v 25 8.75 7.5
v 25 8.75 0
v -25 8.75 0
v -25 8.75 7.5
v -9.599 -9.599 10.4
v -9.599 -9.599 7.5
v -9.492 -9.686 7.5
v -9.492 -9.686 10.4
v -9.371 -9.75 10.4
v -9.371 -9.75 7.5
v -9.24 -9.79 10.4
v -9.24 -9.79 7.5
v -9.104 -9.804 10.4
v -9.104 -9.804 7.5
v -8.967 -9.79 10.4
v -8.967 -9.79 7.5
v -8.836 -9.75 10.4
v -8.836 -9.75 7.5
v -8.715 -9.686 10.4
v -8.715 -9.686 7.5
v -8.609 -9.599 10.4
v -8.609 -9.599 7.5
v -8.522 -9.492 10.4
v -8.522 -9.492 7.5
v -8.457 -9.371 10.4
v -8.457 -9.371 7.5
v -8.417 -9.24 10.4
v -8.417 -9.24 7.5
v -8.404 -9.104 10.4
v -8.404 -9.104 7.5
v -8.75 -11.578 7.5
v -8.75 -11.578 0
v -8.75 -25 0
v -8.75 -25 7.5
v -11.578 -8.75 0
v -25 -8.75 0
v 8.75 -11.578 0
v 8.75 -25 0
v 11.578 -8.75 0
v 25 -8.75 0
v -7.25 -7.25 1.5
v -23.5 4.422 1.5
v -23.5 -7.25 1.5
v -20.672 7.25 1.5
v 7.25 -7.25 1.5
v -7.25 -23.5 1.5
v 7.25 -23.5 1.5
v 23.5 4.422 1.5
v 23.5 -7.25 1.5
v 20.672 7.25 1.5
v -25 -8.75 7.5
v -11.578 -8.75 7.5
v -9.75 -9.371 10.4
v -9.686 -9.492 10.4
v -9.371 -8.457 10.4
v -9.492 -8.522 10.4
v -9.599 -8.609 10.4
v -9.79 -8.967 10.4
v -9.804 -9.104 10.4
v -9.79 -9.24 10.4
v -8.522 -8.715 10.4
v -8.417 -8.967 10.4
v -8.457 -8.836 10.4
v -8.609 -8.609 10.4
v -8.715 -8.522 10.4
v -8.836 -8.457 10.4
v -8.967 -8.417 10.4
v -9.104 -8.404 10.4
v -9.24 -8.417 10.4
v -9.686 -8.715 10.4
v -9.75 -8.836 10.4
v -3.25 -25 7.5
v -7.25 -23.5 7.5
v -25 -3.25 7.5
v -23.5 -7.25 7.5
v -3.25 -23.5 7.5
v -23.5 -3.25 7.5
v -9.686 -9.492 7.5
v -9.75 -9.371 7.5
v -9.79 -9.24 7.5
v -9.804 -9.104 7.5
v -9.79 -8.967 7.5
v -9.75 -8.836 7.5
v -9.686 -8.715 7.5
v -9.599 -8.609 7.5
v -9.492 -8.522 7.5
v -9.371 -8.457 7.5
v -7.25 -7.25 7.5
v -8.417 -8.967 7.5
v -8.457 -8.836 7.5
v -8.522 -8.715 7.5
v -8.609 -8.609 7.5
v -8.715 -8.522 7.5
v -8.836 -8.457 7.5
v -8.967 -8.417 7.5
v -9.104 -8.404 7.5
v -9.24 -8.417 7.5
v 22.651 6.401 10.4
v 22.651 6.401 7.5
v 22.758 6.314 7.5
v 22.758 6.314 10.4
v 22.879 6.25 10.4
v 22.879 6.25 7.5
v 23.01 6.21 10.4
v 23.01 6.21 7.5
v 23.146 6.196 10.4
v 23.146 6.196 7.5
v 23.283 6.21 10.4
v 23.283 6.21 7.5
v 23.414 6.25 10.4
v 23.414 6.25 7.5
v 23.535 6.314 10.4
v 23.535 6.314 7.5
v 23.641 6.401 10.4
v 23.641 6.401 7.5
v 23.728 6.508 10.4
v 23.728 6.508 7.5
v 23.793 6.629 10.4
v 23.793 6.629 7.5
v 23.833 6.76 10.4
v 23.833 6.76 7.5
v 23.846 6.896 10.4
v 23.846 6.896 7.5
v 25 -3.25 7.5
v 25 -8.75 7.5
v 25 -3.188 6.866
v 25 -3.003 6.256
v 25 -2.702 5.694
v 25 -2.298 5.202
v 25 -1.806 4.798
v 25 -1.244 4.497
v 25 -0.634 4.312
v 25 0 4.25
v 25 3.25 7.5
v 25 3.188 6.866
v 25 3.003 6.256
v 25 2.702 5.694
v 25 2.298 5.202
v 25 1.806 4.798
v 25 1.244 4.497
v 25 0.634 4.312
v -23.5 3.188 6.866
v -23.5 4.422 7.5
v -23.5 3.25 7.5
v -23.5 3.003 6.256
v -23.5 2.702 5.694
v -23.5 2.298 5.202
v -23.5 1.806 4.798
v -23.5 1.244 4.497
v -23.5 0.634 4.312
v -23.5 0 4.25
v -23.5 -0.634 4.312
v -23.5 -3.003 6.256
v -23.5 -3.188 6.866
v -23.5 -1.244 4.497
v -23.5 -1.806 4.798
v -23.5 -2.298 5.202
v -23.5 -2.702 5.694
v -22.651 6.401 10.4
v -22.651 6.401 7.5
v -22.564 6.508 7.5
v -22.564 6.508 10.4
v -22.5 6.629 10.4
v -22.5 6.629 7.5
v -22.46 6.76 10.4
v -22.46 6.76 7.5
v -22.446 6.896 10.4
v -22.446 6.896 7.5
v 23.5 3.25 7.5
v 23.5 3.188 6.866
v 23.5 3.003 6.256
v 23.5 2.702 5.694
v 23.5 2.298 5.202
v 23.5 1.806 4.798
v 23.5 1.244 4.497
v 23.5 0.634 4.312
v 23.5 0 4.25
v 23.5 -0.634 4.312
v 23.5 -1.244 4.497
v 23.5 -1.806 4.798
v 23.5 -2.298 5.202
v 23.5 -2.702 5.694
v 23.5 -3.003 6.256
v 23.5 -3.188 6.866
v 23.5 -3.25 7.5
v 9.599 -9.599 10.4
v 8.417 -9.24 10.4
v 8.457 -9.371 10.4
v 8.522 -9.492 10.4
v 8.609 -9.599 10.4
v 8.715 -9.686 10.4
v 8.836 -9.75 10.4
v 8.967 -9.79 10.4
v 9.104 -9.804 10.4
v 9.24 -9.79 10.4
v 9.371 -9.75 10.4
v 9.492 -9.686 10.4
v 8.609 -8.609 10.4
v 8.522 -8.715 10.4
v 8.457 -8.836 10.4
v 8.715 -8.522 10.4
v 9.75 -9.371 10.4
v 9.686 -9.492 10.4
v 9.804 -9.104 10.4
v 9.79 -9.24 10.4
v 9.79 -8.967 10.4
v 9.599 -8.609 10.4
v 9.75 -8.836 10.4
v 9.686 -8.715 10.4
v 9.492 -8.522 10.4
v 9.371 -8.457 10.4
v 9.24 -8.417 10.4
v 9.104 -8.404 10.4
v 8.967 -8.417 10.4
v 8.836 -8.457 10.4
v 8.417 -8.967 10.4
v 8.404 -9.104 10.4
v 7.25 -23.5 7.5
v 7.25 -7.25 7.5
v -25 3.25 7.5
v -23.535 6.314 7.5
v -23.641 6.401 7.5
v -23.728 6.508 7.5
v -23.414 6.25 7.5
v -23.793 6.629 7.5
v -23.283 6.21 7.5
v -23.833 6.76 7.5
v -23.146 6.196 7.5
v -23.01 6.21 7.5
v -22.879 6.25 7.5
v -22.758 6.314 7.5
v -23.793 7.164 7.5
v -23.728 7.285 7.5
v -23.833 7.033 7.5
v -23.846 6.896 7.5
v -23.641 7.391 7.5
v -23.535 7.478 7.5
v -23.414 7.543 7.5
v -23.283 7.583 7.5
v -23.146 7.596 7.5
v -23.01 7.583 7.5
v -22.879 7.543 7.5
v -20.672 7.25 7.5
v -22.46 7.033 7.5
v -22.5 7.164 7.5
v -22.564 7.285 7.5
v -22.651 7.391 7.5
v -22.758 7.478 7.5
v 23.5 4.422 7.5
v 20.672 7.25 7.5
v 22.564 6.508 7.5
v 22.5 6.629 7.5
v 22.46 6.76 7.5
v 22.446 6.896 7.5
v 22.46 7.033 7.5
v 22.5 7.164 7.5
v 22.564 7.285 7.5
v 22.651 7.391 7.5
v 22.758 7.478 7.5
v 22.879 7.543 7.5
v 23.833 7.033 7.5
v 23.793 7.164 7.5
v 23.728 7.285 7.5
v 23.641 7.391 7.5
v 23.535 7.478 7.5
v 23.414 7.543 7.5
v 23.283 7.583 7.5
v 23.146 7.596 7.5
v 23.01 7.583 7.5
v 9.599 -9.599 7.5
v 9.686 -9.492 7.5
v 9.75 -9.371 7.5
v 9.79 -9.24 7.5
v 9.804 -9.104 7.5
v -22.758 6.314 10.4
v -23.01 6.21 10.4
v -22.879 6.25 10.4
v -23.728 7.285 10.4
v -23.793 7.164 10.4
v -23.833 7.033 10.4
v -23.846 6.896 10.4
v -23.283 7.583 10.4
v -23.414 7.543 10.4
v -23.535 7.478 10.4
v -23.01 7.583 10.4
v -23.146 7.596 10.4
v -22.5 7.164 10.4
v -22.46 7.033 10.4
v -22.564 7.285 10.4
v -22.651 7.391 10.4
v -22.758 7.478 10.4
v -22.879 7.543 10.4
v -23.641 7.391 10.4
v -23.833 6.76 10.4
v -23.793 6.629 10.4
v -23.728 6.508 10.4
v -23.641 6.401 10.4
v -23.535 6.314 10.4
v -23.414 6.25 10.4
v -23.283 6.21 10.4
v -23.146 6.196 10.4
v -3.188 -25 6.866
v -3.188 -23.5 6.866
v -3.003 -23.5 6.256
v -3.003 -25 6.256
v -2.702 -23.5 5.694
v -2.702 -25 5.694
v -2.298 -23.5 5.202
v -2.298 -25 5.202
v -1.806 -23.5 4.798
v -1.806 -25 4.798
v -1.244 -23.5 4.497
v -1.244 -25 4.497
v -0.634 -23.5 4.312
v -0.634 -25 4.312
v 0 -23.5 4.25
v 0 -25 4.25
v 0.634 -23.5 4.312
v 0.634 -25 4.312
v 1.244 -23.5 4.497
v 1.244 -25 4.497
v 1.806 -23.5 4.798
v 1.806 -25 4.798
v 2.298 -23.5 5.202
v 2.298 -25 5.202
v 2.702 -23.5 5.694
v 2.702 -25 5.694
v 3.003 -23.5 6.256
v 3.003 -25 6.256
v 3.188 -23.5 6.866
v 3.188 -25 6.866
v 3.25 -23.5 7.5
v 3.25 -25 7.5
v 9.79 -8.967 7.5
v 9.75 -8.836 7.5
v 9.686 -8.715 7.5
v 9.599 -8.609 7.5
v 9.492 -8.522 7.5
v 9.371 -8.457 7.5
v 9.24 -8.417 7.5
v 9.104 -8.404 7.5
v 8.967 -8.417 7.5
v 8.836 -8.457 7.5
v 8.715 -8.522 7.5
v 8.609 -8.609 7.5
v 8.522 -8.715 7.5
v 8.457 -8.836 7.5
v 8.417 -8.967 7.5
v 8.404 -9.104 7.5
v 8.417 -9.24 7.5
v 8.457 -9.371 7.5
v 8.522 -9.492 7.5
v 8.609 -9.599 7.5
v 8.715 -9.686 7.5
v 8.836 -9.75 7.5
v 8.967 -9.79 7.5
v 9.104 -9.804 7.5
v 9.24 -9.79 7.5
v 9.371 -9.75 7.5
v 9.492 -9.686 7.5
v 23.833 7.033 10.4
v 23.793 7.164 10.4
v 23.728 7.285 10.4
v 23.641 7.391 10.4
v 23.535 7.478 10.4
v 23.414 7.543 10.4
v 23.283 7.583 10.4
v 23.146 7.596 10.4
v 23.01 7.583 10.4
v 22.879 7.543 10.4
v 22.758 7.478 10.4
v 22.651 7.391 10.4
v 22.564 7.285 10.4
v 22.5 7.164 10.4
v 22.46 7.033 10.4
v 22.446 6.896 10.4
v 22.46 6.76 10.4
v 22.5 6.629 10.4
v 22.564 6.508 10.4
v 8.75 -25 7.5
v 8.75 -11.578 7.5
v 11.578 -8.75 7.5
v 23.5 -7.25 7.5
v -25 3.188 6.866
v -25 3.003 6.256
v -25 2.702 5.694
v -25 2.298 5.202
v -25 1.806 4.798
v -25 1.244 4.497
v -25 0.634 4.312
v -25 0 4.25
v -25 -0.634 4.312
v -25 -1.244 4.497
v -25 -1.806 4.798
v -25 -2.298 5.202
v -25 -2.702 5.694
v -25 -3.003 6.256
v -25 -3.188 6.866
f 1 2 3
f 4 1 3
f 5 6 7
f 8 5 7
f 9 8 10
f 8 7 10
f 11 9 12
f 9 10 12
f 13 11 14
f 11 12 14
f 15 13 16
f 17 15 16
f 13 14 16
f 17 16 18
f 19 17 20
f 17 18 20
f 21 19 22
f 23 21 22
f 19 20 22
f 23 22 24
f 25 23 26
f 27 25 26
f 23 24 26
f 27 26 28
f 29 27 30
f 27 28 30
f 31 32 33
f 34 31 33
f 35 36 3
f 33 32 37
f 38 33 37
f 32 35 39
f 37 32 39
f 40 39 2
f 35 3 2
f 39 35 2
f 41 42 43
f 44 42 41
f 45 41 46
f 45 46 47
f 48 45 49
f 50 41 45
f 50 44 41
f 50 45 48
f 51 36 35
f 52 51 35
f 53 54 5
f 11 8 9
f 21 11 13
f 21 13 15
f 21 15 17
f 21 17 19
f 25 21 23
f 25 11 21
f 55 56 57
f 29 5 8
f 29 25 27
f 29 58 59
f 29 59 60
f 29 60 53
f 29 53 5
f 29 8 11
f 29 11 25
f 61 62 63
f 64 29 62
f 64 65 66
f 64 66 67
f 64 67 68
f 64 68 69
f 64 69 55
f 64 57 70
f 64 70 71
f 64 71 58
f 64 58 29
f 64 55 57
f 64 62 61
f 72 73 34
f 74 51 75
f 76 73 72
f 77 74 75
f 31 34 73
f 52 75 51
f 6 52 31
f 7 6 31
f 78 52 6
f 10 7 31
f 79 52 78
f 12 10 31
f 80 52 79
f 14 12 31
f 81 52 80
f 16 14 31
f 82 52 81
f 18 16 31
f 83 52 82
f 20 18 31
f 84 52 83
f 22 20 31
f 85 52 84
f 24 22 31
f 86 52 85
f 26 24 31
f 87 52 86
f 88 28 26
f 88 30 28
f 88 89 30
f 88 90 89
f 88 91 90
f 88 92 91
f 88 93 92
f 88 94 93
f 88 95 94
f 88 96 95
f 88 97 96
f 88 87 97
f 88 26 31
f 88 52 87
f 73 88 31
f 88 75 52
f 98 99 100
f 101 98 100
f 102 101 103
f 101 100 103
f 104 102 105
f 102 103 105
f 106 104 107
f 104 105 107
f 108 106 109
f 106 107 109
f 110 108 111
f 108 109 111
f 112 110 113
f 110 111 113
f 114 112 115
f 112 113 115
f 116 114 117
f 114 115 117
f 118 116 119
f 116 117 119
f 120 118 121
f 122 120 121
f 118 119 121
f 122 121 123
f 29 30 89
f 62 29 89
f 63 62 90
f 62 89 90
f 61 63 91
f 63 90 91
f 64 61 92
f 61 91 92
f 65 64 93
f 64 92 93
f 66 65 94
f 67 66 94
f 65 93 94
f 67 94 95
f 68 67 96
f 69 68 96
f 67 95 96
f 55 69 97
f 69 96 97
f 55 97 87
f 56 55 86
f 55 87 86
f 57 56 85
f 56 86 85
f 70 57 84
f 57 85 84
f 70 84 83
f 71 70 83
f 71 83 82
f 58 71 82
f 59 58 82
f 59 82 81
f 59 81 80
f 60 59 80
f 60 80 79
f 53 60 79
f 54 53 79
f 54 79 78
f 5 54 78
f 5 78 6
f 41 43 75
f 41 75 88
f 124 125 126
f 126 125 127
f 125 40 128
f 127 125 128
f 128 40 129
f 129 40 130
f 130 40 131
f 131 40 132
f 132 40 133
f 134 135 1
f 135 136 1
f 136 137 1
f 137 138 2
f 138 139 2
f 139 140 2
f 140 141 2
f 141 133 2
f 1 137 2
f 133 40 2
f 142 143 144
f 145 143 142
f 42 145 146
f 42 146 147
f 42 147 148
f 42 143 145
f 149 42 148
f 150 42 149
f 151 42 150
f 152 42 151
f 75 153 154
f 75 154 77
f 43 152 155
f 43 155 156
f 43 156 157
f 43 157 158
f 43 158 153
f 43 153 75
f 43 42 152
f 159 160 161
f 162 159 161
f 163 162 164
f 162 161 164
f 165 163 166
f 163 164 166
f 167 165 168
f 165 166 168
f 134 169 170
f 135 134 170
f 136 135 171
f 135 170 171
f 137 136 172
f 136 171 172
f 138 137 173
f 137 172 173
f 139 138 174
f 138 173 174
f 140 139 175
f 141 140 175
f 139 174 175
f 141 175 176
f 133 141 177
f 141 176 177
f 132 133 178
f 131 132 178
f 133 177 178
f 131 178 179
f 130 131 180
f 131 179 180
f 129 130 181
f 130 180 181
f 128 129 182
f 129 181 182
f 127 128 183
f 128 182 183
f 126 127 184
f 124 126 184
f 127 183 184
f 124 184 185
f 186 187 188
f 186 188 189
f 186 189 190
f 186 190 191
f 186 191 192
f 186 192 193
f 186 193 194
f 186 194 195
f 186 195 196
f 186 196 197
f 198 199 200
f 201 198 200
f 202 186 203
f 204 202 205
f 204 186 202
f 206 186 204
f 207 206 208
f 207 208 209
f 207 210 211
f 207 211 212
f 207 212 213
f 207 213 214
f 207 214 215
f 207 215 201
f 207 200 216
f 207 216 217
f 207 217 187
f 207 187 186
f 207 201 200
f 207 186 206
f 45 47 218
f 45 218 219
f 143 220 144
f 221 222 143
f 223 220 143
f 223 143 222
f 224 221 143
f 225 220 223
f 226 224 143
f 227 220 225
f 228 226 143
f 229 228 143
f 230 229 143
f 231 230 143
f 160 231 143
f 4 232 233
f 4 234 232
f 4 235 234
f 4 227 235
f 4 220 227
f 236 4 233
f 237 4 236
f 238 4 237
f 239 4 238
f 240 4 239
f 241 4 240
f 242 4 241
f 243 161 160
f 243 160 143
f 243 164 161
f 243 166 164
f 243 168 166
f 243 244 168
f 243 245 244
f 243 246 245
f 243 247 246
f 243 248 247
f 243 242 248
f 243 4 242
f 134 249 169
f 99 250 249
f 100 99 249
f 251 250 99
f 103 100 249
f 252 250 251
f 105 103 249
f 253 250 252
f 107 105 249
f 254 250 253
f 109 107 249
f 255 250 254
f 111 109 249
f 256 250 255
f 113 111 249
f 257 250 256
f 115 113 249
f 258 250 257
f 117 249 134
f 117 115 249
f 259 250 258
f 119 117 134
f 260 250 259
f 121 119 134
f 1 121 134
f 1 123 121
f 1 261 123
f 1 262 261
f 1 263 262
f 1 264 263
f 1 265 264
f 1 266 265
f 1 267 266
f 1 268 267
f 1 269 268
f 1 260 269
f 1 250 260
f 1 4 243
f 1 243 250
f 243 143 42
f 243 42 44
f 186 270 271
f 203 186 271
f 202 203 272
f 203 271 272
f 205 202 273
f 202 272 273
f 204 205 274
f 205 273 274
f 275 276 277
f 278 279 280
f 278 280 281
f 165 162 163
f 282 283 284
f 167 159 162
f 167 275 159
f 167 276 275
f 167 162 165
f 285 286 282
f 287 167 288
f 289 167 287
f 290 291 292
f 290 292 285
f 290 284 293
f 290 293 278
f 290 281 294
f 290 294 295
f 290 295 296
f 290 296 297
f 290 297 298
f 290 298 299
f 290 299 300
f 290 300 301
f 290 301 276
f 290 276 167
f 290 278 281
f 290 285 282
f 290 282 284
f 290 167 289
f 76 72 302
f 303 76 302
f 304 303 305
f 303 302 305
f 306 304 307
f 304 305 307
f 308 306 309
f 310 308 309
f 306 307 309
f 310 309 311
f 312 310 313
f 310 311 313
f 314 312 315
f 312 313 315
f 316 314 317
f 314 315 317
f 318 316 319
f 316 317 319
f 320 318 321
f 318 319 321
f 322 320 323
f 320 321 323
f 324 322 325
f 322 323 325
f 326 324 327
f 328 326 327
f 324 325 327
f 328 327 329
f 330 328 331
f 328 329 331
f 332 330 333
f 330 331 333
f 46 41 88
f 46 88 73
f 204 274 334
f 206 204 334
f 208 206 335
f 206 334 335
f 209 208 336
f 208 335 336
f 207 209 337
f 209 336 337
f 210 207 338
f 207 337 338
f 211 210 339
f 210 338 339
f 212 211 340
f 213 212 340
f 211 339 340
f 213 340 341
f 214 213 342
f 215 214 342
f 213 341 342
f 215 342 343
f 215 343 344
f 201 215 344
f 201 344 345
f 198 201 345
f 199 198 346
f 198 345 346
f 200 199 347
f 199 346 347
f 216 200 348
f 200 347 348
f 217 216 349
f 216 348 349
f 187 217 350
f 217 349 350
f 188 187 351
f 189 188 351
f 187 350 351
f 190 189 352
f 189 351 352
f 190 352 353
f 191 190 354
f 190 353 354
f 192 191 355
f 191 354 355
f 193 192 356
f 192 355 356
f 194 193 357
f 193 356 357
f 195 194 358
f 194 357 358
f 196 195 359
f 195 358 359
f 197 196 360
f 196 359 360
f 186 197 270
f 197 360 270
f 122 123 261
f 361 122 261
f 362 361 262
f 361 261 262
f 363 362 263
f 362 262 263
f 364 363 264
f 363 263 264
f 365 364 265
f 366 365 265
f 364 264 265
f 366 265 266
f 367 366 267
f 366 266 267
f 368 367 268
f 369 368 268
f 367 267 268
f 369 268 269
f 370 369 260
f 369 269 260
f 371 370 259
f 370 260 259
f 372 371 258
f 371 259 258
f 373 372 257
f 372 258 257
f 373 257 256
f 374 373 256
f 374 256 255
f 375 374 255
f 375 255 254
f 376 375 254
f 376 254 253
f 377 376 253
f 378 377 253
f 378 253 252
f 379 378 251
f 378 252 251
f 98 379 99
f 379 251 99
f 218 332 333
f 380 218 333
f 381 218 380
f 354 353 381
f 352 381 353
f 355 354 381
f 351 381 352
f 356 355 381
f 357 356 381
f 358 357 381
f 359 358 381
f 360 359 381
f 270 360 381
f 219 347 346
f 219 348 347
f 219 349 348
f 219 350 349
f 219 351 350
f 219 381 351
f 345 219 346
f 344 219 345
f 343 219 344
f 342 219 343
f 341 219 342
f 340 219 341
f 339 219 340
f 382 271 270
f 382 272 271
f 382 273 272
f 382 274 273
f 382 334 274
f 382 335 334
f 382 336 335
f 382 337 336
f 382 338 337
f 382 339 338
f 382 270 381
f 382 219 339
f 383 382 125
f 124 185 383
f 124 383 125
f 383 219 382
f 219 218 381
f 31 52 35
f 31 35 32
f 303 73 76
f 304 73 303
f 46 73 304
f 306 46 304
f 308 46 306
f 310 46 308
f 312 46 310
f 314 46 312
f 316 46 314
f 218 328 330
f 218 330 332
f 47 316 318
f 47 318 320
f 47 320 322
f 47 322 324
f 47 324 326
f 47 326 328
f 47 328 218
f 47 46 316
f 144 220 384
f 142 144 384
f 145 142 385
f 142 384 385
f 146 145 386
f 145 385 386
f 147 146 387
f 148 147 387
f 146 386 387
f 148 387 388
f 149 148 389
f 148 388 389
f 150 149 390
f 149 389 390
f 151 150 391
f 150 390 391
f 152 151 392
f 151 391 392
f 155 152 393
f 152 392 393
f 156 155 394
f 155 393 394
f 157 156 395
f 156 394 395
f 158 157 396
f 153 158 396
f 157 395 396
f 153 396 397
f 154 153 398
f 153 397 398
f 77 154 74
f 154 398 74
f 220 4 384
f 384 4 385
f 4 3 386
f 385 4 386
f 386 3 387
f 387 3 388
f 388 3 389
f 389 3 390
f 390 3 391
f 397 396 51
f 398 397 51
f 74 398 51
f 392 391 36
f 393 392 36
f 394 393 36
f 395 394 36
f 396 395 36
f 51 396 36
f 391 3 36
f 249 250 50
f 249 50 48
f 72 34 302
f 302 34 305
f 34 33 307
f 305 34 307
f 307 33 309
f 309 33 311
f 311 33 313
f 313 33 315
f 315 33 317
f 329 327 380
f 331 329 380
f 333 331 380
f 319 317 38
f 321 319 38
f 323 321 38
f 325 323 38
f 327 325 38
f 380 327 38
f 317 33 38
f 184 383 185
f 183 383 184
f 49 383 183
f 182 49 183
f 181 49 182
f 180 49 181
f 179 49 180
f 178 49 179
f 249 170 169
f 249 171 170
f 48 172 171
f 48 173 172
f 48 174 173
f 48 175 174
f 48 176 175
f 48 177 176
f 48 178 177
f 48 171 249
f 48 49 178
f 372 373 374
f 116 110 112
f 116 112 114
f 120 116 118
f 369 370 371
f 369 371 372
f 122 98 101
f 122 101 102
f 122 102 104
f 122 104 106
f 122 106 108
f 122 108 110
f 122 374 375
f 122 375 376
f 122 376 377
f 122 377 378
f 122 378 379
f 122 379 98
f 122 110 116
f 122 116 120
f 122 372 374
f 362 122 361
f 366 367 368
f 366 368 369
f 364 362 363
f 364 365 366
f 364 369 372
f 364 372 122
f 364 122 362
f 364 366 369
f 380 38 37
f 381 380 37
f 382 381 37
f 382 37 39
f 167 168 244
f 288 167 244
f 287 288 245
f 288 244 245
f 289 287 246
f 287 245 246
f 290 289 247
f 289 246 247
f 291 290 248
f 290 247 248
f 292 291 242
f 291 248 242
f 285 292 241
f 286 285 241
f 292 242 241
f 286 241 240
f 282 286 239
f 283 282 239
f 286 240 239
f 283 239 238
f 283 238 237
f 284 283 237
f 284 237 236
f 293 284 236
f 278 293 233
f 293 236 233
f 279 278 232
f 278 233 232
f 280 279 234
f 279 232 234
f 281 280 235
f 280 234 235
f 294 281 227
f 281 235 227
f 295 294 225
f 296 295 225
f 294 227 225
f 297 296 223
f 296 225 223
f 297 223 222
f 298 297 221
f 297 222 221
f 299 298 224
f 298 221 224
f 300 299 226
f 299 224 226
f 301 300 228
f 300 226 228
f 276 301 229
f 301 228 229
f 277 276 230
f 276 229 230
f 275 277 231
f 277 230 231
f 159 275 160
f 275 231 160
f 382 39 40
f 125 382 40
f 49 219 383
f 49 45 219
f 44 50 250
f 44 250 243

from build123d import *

# Parameters (mm, degrees)
F1_DEPTH  = 7.5
F2_T      = -1.5
F4_DEPTH  = 7.5
F6_DEPTH  = 2.9
F7_R      = 3.25
F8_DEPTH  = 32.25
F9_R      = 3.25
F10_DEPTH = 50.001


with BuildPart() as f1:
    # F0 (on Top) → F1 (new body)
    with BuildSketch(Plane.XY):
        Polygon((25, -8.75), (25, 8.75), (8.75, 8.75), (-8.75, 8.75), (-25, 8.75), (-25, -8.75), (-8.75, -8.75), (-8.75, -25), (0, -25), (8.75, -25), (8.75, -8.75), align=None)
    extrude(amount=F1_DEPTH)

    # F2
    f2_openings = [f1.faces().sort_by_distance(p)[0] for p in [
        (0, -4.139151, 7.5),
    ]]
    offset(amount=F2_T, openings=f2_openings, kind=Kind.INTERSECTION)

    # F3 (on face) → F4 (join, through all)
    with BuildSketch(Plane.XY.offset(7.5)):
        Polygon((-23.5, 7.25), (-23.5, 4.4215728753), (-20.6715728753, 7.25), align=None)
        Polygon((-8.75, -8.75), (-11.5784271247, -8.75), (-8.75, -11.5784271247), align=None)
        Polygon((23.5, 7.25), (20.6715728753, 7.25), (23.5, 4.4215728753), align=None)
        Polygon((8.75, -11.5784271247), (11.5784271247, -8.75), (8.75, -8.75), align=None)
    extrude(amount=-F4_DEPTH)

    # F5 (on face) → F6 (join)
    with BuildSketch(Plane.XY.offset(7.5)):
        with BuildLine():
            ThreePointArc((-9.5985281374, -9.5985281374), (-8.8356749879, -9.7502690634), (-8.4035533906, -9.1035533906))
            ThreePointArc((-8.4035533906, -9.1035533906), (-9.3714317932, -8.4568377178), (-9.5985281374, -9.5985281374))
        make_face()
        with BuildLine():
            ThreePointArc((-22.6514718626, 6.4014718626), (-22.4997309366, 6.6285682068), (-22.4464466094, 6.8964466094))
            ThreePointArc((-22.4464466094, 6.8964466094), (-23.7931622822, 7.1643250121), (-22.6514718626, 6.4014718626))
        make_face()
        with BuildLine():
            ThreePointArc((9.5985281374, -9.5985281374), (9.7502690634, -9.3714317932), (9.8035533906, -9.1035533906))
            ThreePointArc((9.8035533906, -9.1035533906), (8.4568377178, -8.8356749879), (9.5985281374, -9.5985281374))
        make_face()
        with BuildLine():
            ThreePointArc((22.6514718626, 6.4014718626), (23.4143250121, 6.2497309366), (23.8464466094, 6.8964466094))
            ThreePointArc((23.8464466094, 6.8964466094), (22.8785682068, 7.5431622822), (22.6514718626, 6.4014718626))
        make_face()
    extrude(amount=F6_DEPTH)

    # F7 (on face) → F8 (cut, through all)
    with BuildSketch(Plane.XZ.offset(25)):
        with Locations((0, 7.5)):
            Circle(F7_R)
    extrude(amount=-F8_DEPTH, mode=Mode.SUBTRACT)

    # F9 (on face) → F10 (cut, through all)
    with BuildSketch(Plane(origin=(-25, 0, 0), x_dir=(0, -1, 0), z_dir=(-1, 0, 0))):
        with Locations((0, 7.5)):
            Circle(F9_R)
    extrude(amount=-F10_DEPTH, mode=Mode.SUBTRACT)


solid = f1.part
